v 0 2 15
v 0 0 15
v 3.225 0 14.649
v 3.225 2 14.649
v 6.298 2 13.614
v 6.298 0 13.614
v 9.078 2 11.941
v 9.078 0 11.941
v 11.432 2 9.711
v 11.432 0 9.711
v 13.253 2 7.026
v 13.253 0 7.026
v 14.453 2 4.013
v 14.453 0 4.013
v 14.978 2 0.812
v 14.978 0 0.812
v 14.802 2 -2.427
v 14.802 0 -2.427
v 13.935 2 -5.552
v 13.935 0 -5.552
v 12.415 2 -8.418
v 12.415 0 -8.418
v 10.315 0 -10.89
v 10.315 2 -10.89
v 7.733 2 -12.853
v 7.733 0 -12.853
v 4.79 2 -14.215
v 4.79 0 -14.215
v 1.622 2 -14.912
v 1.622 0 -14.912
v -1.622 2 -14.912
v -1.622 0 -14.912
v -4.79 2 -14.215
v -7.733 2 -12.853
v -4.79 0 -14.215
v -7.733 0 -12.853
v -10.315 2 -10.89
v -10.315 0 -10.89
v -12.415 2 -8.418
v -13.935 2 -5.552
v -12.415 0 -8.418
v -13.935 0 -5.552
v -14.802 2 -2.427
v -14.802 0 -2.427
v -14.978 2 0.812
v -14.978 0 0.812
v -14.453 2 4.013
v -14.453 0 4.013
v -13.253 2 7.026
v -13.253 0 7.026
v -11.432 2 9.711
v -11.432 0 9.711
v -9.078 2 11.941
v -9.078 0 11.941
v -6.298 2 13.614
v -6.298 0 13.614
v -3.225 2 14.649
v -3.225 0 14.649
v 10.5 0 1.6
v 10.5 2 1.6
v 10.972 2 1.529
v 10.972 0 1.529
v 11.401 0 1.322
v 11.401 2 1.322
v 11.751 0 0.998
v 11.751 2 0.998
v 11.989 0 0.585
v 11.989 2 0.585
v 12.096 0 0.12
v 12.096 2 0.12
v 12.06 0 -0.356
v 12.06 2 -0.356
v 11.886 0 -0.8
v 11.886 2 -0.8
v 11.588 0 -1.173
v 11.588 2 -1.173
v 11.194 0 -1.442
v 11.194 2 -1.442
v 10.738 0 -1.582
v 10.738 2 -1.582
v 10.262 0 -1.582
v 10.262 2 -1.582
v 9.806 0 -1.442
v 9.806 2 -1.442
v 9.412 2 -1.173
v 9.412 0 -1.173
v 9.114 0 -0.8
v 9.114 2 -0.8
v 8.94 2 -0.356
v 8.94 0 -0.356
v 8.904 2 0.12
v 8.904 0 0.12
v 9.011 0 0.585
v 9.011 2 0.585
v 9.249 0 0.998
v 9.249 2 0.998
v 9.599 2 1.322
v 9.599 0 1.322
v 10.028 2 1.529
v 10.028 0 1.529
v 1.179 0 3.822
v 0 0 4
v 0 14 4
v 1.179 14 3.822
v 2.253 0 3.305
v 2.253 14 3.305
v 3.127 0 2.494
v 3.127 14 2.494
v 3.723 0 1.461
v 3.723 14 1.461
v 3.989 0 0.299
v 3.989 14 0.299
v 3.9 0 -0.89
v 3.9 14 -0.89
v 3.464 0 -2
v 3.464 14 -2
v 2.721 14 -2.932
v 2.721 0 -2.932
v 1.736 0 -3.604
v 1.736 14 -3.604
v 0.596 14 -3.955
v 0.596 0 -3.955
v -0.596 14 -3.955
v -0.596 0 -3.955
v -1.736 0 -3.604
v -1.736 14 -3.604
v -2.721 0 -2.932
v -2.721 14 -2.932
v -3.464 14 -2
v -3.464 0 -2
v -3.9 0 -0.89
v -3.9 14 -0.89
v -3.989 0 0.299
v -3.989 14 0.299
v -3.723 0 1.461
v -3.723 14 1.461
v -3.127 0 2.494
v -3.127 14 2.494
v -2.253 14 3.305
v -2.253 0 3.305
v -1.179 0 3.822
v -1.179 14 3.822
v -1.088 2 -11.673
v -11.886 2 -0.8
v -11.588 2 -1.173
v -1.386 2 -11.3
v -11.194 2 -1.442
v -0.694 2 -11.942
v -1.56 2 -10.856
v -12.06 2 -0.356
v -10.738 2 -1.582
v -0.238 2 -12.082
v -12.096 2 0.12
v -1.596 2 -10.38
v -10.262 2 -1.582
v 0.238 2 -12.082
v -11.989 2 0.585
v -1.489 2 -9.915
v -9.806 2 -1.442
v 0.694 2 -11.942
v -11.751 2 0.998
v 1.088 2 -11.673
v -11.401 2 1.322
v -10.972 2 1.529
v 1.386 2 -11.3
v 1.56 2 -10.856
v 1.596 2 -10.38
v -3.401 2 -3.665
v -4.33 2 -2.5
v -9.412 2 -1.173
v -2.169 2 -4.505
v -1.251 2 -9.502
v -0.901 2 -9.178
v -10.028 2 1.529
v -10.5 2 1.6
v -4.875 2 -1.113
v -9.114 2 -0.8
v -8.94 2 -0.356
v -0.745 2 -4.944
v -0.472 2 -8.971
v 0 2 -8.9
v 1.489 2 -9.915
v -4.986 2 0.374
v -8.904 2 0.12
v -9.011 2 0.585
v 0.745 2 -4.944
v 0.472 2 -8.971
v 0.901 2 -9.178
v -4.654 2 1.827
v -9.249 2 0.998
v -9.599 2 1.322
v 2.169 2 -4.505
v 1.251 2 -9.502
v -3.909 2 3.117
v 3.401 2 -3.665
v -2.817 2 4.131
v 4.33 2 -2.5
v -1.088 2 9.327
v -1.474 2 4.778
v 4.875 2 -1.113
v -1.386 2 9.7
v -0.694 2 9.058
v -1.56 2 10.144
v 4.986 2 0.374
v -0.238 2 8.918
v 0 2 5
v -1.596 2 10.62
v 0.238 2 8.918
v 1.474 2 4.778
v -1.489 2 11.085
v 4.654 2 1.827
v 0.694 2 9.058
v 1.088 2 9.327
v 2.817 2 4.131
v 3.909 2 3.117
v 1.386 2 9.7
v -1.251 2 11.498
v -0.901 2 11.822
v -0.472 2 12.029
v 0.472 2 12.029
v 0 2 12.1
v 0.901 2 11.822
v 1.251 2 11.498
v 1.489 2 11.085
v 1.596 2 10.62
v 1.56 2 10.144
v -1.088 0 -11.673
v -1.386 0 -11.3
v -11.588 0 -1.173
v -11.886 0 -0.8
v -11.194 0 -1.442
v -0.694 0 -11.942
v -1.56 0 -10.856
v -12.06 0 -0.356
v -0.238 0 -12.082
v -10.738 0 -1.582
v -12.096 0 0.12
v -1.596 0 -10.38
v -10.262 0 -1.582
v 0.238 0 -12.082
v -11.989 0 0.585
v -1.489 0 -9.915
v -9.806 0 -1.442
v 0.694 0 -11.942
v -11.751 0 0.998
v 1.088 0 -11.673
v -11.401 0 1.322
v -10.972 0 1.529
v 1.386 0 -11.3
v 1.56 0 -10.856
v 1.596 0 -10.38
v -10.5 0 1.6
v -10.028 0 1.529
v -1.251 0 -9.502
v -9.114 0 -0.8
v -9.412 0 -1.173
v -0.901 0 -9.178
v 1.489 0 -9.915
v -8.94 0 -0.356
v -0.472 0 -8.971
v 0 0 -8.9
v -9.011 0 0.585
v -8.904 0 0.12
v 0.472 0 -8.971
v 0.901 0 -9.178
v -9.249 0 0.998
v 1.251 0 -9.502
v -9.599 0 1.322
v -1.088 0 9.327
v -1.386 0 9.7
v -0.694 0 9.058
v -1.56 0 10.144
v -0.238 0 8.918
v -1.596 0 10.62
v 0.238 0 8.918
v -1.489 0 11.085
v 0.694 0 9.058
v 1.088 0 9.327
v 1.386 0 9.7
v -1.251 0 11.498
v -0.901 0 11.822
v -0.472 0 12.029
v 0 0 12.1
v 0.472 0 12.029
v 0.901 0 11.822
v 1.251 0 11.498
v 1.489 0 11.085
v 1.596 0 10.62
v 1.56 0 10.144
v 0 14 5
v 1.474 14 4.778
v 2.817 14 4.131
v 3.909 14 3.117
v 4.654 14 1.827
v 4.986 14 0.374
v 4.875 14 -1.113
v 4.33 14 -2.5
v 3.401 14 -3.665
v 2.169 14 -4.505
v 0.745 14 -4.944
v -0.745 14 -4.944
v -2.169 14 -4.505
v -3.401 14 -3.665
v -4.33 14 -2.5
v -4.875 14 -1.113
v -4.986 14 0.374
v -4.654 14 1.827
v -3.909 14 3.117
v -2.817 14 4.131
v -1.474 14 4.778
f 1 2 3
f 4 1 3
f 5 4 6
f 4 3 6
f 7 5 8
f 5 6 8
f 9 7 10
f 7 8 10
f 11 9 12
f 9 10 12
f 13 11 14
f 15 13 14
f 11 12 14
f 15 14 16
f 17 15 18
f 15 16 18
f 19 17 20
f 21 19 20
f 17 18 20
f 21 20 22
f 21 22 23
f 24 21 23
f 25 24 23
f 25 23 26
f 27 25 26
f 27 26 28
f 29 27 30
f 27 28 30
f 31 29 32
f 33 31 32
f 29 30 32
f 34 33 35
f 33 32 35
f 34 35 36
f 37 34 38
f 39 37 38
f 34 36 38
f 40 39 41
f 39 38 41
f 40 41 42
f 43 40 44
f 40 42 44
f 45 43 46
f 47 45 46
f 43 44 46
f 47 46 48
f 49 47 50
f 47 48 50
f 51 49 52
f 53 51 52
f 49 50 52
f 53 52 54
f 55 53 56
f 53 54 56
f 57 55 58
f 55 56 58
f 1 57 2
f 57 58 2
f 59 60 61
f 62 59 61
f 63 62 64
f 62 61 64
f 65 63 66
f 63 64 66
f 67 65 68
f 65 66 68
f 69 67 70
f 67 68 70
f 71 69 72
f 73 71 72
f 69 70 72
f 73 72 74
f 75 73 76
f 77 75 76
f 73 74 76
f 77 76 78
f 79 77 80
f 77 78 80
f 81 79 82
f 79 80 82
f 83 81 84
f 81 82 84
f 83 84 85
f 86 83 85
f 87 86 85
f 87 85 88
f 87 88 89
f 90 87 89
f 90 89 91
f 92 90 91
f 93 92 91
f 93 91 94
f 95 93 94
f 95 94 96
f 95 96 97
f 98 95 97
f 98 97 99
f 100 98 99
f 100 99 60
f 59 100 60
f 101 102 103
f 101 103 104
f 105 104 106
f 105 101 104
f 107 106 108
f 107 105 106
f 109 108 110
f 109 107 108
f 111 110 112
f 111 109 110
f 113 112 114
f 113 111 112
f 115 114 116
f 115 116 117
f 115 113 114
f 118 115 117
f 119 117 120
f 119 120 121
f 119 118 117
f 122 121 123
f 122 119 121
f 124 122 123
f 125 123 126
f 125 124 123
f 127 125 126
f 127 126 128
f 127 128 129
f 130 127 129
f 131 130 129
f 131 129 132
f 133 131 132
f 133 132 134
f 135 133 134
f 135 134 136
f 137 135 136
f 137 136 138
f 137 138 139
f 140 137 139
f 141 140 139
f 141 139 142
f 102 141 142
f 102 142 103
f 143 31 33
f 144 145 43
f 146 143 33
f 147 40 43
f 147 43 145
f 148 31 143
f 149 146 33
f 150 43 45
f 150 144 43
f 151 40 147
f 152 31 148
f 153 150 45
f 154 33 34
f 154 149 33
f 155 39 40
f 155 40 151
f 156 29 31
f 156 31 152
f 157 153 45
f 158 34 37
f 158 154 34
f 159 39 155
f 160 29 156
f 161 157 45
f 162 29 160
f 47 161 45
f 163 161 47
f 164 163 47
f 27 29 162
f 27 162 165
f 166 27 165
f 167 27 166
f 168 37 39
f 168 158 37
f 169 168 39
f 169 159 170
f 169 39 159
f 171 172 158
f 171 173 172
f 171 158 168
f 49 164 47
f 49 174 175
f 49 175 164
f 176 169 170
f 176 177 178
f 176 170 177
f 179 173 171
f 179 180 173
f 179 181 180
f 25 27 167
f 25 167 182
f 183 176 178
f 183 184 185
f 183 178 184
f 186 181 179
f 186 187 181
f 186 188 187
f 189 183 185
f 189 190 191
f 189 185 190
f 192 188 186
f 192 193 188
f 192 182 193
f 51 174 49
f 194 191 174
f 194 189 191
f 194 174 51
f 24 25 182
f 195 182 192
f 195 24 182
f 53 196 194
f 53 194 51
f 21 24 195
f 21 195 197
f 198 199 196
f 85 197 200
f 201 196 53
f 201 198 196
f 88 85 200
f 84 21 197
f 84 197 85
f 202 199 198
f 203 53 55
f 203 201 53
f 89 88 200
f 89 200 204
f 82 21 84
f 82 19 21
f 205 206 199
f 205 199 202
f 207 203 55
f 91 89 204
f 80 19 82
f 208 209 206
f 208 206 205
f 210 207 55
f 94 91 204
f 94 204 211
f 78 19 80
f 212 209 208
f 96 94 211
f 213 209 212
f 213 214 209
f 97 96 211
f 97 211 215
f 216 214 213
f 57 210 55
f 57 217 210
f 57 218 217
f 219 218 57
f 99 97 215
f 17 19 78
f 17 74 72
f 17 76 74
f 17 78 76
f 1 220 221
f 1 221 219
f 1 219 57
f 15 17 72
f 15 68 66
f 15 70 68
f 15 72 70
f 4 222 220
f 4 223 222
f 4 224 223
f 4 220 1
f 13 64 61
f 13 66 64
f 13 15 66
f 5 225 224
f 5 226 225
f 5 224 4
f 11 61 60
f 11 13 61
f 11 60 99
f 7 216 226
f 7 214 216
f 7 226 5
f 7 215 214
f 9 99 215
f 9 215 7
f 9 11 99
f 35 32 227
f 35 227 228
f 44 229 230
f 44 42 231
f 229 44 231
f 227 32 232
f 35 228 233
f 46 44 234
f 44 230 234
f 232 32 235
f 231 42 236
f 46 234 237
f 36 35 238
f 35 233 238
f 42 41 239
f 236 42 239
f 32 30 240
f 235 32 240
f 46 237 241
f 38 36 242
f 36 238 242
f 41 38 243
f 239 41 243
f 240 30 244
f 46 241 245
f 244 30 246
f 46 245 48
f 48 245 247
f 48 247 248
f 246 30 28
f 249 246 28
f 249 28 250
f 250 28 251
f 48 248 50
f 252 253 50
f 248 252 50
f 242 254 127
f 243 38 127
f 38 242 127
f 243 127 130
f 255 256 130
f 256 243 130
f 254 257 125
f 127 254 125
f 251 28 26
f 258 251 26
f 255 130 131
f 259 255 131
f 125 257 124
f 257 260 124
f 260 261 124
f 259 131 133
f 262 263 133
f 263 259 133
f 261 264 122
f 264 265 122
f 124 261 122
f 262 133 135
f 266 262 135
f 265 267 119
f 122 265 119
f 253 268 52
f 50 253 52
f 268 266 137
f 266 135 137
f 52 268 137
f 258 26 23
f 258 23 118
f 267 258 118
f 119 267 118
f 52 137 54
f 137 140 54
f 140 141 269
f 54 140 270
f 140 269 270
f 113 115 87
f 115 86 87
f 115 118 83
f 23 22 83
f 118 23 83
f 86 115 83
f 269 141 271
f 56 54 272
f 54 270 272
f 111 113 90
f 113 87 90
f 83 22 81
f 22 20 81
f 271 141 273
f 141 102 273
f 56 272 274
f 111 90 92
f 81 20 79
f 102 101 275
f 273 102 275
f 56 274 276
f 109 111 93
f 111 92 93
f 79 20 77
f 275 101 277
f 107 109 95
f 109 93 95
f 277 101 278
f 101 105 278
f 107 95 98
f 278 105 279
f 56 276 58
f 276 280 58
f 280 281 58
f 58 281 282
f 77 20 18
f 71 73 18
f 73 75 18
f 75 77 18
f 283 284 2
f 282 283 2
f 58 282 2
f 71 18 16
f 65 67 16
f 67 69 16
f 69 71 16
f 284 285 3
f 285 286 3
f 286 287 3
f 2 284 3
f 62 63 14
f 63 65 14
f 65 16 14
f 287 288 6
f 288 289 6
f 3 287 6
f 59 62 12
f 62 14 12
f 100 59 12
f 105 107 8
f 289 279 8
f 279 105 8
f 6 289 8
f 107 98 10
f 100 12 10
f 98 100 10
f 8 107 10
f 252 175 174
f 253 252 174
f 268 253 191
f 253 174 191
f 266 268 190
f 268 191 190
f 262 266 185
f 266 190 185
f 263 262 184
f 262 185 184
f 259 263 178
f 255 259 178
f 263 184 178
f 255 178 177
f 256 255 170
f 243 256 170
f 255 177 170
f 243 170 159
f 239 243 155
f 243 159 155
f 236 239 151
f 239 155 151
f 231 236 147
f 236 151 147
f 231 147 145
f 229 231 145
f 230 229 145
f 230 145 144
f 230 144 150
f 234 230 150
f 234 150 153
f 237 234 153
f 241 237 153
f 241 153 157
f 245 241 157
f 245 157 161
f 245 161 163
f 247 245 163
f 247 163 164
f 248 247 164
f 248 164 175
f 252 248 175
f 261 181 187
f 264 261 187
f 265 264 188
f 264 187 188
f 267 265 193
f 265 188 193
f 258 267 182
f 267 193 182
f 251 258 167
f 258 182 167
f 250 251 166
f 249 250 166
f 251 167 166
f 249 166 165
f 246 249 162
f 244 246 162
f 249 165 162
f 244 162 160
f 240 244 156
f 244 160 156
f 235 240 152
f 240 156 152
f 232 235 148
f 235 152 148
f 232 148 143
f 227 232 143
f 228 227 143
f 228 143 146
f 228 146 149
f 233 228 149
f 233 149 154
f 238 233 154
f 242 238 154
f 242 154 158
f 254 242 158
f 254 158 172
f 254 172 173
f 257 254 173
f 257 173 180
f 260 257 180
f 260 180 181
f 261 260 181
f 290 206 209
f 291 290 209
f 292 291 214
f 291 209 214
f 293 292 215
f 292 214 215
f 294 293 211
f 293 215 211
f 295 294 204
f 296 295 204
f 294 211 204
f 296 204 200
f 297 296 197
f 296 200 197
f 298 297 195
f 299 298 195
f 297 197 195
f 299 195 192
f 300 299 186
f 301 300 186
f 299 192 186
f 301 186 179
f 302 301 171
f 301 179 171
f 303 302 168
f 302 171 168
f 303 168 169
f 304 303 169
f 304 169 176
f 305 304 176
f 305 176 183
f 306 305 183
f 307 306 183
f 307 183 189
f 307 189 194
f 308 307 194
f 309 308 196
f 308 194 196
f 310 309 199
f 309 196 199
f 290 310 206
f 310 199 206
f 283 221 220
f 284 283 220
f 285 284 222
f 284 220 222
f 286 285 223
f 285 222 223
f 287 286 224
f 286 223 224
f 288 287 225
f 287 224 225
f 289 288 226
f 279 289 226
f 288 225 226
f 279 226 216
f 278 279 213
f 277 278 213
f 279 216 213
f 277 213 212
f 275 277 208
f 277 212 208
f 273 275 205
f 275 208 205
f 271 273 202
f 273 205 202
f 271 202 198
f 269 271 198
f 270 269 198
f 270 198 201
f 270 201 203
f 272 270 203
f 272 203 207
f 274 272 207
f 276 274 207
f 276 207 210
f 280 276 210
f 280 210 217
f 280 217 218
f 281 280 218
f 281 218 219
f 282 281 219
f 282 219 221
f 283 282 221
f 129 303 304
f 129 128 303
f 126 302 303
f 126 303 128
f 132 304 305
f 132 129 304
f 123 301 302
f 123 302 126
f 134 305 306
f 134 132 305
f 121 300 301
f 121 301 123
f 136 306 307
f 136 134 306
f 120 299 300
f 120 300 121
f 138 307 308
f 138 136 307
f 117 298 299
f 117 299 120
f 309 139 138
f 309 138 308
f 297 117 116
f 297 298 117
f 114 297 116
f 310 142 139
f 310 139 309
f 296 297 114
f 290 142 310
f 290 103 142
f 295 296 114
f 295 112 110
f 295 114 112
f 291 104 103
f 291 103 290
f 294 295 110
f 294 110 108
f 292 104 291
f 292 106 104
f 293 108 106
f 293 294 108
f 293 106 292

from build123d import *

# Parameters (mm, degrees)
SKETCH_1_R          = 15
EXTRUDE_1_DEPTH     = 2
SKETCH_2_R          = 5
SKETCH_2_R_2        = 4
EXTRUDE_2_DEPTH     = 12
CUT_EXTRUDE_START   = -12
SKETCH_3_R          = 4
CUT_EXTRUDE_1_DEPTH = 12
SKETCH_4_R          = 1.6
CUT_EXTRUDE_2_DEPTH = 12


with BuildPart() as part:
    # 草图1 → 凸台-拉伸1 (new body)
    with BuildSketch(Plane(origin=(0, 0, 0), x_dir=(1, 0, 0), z_dir=(0, 1, 0))):
        with Locations(Location((0, 0, 0), (0, 0, 270))):
            Circle(SKETCH_1_R)
    extrude(amount=EXTRUDE_1_DEPTH)

    # 草图2 → 凸台-拉伸2 (add)
    with BuildSketch(Plane(origin=(0, 2, 0), x_dir=(1, 0, 0), z_dir=(0, 1, 0))):
        with Locations(Location((0, 0, 0), (0, 0, 270))):
            Circle(SKETCH_2_R)
        with Locations(Location((0, 0, 0), (0, 0, 270))):
            Circle(SKETCH_2_R_2, mode=Mode.SUBTRACT)
    extrude(amount=EXTRUDE_2_DEPTH)

    # 草图3 → 切除-拉伸1 (cut)
    with BuildSketch(Plane(origin=(0, 2, 0), x_dir=(1, 0, 0), z_dir=(0, 1, 0)).offset(CUT_EXTRUDE_START)):
        with Locations(Location((0, 0, 0), (0, 0, 270))):
            Circle(SKETCH_3_R)
    extrude(amount=CUT_EXTRUDE_1_DEPTH, mode=Mode.SUBTRACT)

    # 草图4 → 切除-拉伸2 (cut)
    with BuildSketch(Plane(origin=(0, 2, 0), x_dir=(1, 0, 0), z_dir=(0, 1, 0))):
        with Locations(Location((0, 10.5, 0), (0, 0, 270))):
            Circle(SKETCH_4_R)
        with Locations(Location((10.5, 0, 0), (0, 0, 270))):
            Circle(SKETCH_4_R)
        with Locations(Location((0, -10.5, 0), (0, 0, 270))):
            Circle(SKETCH_4_R)
        with Locations(Location((-10.5, 0, 0), (0, 0, 270))):
            Circle(SKETCH_4_R)
    extrude(amount=-CUT_EXTRUDE_2_DEPTH, mode=Mode.SUBTRACT)


solid = part.part
